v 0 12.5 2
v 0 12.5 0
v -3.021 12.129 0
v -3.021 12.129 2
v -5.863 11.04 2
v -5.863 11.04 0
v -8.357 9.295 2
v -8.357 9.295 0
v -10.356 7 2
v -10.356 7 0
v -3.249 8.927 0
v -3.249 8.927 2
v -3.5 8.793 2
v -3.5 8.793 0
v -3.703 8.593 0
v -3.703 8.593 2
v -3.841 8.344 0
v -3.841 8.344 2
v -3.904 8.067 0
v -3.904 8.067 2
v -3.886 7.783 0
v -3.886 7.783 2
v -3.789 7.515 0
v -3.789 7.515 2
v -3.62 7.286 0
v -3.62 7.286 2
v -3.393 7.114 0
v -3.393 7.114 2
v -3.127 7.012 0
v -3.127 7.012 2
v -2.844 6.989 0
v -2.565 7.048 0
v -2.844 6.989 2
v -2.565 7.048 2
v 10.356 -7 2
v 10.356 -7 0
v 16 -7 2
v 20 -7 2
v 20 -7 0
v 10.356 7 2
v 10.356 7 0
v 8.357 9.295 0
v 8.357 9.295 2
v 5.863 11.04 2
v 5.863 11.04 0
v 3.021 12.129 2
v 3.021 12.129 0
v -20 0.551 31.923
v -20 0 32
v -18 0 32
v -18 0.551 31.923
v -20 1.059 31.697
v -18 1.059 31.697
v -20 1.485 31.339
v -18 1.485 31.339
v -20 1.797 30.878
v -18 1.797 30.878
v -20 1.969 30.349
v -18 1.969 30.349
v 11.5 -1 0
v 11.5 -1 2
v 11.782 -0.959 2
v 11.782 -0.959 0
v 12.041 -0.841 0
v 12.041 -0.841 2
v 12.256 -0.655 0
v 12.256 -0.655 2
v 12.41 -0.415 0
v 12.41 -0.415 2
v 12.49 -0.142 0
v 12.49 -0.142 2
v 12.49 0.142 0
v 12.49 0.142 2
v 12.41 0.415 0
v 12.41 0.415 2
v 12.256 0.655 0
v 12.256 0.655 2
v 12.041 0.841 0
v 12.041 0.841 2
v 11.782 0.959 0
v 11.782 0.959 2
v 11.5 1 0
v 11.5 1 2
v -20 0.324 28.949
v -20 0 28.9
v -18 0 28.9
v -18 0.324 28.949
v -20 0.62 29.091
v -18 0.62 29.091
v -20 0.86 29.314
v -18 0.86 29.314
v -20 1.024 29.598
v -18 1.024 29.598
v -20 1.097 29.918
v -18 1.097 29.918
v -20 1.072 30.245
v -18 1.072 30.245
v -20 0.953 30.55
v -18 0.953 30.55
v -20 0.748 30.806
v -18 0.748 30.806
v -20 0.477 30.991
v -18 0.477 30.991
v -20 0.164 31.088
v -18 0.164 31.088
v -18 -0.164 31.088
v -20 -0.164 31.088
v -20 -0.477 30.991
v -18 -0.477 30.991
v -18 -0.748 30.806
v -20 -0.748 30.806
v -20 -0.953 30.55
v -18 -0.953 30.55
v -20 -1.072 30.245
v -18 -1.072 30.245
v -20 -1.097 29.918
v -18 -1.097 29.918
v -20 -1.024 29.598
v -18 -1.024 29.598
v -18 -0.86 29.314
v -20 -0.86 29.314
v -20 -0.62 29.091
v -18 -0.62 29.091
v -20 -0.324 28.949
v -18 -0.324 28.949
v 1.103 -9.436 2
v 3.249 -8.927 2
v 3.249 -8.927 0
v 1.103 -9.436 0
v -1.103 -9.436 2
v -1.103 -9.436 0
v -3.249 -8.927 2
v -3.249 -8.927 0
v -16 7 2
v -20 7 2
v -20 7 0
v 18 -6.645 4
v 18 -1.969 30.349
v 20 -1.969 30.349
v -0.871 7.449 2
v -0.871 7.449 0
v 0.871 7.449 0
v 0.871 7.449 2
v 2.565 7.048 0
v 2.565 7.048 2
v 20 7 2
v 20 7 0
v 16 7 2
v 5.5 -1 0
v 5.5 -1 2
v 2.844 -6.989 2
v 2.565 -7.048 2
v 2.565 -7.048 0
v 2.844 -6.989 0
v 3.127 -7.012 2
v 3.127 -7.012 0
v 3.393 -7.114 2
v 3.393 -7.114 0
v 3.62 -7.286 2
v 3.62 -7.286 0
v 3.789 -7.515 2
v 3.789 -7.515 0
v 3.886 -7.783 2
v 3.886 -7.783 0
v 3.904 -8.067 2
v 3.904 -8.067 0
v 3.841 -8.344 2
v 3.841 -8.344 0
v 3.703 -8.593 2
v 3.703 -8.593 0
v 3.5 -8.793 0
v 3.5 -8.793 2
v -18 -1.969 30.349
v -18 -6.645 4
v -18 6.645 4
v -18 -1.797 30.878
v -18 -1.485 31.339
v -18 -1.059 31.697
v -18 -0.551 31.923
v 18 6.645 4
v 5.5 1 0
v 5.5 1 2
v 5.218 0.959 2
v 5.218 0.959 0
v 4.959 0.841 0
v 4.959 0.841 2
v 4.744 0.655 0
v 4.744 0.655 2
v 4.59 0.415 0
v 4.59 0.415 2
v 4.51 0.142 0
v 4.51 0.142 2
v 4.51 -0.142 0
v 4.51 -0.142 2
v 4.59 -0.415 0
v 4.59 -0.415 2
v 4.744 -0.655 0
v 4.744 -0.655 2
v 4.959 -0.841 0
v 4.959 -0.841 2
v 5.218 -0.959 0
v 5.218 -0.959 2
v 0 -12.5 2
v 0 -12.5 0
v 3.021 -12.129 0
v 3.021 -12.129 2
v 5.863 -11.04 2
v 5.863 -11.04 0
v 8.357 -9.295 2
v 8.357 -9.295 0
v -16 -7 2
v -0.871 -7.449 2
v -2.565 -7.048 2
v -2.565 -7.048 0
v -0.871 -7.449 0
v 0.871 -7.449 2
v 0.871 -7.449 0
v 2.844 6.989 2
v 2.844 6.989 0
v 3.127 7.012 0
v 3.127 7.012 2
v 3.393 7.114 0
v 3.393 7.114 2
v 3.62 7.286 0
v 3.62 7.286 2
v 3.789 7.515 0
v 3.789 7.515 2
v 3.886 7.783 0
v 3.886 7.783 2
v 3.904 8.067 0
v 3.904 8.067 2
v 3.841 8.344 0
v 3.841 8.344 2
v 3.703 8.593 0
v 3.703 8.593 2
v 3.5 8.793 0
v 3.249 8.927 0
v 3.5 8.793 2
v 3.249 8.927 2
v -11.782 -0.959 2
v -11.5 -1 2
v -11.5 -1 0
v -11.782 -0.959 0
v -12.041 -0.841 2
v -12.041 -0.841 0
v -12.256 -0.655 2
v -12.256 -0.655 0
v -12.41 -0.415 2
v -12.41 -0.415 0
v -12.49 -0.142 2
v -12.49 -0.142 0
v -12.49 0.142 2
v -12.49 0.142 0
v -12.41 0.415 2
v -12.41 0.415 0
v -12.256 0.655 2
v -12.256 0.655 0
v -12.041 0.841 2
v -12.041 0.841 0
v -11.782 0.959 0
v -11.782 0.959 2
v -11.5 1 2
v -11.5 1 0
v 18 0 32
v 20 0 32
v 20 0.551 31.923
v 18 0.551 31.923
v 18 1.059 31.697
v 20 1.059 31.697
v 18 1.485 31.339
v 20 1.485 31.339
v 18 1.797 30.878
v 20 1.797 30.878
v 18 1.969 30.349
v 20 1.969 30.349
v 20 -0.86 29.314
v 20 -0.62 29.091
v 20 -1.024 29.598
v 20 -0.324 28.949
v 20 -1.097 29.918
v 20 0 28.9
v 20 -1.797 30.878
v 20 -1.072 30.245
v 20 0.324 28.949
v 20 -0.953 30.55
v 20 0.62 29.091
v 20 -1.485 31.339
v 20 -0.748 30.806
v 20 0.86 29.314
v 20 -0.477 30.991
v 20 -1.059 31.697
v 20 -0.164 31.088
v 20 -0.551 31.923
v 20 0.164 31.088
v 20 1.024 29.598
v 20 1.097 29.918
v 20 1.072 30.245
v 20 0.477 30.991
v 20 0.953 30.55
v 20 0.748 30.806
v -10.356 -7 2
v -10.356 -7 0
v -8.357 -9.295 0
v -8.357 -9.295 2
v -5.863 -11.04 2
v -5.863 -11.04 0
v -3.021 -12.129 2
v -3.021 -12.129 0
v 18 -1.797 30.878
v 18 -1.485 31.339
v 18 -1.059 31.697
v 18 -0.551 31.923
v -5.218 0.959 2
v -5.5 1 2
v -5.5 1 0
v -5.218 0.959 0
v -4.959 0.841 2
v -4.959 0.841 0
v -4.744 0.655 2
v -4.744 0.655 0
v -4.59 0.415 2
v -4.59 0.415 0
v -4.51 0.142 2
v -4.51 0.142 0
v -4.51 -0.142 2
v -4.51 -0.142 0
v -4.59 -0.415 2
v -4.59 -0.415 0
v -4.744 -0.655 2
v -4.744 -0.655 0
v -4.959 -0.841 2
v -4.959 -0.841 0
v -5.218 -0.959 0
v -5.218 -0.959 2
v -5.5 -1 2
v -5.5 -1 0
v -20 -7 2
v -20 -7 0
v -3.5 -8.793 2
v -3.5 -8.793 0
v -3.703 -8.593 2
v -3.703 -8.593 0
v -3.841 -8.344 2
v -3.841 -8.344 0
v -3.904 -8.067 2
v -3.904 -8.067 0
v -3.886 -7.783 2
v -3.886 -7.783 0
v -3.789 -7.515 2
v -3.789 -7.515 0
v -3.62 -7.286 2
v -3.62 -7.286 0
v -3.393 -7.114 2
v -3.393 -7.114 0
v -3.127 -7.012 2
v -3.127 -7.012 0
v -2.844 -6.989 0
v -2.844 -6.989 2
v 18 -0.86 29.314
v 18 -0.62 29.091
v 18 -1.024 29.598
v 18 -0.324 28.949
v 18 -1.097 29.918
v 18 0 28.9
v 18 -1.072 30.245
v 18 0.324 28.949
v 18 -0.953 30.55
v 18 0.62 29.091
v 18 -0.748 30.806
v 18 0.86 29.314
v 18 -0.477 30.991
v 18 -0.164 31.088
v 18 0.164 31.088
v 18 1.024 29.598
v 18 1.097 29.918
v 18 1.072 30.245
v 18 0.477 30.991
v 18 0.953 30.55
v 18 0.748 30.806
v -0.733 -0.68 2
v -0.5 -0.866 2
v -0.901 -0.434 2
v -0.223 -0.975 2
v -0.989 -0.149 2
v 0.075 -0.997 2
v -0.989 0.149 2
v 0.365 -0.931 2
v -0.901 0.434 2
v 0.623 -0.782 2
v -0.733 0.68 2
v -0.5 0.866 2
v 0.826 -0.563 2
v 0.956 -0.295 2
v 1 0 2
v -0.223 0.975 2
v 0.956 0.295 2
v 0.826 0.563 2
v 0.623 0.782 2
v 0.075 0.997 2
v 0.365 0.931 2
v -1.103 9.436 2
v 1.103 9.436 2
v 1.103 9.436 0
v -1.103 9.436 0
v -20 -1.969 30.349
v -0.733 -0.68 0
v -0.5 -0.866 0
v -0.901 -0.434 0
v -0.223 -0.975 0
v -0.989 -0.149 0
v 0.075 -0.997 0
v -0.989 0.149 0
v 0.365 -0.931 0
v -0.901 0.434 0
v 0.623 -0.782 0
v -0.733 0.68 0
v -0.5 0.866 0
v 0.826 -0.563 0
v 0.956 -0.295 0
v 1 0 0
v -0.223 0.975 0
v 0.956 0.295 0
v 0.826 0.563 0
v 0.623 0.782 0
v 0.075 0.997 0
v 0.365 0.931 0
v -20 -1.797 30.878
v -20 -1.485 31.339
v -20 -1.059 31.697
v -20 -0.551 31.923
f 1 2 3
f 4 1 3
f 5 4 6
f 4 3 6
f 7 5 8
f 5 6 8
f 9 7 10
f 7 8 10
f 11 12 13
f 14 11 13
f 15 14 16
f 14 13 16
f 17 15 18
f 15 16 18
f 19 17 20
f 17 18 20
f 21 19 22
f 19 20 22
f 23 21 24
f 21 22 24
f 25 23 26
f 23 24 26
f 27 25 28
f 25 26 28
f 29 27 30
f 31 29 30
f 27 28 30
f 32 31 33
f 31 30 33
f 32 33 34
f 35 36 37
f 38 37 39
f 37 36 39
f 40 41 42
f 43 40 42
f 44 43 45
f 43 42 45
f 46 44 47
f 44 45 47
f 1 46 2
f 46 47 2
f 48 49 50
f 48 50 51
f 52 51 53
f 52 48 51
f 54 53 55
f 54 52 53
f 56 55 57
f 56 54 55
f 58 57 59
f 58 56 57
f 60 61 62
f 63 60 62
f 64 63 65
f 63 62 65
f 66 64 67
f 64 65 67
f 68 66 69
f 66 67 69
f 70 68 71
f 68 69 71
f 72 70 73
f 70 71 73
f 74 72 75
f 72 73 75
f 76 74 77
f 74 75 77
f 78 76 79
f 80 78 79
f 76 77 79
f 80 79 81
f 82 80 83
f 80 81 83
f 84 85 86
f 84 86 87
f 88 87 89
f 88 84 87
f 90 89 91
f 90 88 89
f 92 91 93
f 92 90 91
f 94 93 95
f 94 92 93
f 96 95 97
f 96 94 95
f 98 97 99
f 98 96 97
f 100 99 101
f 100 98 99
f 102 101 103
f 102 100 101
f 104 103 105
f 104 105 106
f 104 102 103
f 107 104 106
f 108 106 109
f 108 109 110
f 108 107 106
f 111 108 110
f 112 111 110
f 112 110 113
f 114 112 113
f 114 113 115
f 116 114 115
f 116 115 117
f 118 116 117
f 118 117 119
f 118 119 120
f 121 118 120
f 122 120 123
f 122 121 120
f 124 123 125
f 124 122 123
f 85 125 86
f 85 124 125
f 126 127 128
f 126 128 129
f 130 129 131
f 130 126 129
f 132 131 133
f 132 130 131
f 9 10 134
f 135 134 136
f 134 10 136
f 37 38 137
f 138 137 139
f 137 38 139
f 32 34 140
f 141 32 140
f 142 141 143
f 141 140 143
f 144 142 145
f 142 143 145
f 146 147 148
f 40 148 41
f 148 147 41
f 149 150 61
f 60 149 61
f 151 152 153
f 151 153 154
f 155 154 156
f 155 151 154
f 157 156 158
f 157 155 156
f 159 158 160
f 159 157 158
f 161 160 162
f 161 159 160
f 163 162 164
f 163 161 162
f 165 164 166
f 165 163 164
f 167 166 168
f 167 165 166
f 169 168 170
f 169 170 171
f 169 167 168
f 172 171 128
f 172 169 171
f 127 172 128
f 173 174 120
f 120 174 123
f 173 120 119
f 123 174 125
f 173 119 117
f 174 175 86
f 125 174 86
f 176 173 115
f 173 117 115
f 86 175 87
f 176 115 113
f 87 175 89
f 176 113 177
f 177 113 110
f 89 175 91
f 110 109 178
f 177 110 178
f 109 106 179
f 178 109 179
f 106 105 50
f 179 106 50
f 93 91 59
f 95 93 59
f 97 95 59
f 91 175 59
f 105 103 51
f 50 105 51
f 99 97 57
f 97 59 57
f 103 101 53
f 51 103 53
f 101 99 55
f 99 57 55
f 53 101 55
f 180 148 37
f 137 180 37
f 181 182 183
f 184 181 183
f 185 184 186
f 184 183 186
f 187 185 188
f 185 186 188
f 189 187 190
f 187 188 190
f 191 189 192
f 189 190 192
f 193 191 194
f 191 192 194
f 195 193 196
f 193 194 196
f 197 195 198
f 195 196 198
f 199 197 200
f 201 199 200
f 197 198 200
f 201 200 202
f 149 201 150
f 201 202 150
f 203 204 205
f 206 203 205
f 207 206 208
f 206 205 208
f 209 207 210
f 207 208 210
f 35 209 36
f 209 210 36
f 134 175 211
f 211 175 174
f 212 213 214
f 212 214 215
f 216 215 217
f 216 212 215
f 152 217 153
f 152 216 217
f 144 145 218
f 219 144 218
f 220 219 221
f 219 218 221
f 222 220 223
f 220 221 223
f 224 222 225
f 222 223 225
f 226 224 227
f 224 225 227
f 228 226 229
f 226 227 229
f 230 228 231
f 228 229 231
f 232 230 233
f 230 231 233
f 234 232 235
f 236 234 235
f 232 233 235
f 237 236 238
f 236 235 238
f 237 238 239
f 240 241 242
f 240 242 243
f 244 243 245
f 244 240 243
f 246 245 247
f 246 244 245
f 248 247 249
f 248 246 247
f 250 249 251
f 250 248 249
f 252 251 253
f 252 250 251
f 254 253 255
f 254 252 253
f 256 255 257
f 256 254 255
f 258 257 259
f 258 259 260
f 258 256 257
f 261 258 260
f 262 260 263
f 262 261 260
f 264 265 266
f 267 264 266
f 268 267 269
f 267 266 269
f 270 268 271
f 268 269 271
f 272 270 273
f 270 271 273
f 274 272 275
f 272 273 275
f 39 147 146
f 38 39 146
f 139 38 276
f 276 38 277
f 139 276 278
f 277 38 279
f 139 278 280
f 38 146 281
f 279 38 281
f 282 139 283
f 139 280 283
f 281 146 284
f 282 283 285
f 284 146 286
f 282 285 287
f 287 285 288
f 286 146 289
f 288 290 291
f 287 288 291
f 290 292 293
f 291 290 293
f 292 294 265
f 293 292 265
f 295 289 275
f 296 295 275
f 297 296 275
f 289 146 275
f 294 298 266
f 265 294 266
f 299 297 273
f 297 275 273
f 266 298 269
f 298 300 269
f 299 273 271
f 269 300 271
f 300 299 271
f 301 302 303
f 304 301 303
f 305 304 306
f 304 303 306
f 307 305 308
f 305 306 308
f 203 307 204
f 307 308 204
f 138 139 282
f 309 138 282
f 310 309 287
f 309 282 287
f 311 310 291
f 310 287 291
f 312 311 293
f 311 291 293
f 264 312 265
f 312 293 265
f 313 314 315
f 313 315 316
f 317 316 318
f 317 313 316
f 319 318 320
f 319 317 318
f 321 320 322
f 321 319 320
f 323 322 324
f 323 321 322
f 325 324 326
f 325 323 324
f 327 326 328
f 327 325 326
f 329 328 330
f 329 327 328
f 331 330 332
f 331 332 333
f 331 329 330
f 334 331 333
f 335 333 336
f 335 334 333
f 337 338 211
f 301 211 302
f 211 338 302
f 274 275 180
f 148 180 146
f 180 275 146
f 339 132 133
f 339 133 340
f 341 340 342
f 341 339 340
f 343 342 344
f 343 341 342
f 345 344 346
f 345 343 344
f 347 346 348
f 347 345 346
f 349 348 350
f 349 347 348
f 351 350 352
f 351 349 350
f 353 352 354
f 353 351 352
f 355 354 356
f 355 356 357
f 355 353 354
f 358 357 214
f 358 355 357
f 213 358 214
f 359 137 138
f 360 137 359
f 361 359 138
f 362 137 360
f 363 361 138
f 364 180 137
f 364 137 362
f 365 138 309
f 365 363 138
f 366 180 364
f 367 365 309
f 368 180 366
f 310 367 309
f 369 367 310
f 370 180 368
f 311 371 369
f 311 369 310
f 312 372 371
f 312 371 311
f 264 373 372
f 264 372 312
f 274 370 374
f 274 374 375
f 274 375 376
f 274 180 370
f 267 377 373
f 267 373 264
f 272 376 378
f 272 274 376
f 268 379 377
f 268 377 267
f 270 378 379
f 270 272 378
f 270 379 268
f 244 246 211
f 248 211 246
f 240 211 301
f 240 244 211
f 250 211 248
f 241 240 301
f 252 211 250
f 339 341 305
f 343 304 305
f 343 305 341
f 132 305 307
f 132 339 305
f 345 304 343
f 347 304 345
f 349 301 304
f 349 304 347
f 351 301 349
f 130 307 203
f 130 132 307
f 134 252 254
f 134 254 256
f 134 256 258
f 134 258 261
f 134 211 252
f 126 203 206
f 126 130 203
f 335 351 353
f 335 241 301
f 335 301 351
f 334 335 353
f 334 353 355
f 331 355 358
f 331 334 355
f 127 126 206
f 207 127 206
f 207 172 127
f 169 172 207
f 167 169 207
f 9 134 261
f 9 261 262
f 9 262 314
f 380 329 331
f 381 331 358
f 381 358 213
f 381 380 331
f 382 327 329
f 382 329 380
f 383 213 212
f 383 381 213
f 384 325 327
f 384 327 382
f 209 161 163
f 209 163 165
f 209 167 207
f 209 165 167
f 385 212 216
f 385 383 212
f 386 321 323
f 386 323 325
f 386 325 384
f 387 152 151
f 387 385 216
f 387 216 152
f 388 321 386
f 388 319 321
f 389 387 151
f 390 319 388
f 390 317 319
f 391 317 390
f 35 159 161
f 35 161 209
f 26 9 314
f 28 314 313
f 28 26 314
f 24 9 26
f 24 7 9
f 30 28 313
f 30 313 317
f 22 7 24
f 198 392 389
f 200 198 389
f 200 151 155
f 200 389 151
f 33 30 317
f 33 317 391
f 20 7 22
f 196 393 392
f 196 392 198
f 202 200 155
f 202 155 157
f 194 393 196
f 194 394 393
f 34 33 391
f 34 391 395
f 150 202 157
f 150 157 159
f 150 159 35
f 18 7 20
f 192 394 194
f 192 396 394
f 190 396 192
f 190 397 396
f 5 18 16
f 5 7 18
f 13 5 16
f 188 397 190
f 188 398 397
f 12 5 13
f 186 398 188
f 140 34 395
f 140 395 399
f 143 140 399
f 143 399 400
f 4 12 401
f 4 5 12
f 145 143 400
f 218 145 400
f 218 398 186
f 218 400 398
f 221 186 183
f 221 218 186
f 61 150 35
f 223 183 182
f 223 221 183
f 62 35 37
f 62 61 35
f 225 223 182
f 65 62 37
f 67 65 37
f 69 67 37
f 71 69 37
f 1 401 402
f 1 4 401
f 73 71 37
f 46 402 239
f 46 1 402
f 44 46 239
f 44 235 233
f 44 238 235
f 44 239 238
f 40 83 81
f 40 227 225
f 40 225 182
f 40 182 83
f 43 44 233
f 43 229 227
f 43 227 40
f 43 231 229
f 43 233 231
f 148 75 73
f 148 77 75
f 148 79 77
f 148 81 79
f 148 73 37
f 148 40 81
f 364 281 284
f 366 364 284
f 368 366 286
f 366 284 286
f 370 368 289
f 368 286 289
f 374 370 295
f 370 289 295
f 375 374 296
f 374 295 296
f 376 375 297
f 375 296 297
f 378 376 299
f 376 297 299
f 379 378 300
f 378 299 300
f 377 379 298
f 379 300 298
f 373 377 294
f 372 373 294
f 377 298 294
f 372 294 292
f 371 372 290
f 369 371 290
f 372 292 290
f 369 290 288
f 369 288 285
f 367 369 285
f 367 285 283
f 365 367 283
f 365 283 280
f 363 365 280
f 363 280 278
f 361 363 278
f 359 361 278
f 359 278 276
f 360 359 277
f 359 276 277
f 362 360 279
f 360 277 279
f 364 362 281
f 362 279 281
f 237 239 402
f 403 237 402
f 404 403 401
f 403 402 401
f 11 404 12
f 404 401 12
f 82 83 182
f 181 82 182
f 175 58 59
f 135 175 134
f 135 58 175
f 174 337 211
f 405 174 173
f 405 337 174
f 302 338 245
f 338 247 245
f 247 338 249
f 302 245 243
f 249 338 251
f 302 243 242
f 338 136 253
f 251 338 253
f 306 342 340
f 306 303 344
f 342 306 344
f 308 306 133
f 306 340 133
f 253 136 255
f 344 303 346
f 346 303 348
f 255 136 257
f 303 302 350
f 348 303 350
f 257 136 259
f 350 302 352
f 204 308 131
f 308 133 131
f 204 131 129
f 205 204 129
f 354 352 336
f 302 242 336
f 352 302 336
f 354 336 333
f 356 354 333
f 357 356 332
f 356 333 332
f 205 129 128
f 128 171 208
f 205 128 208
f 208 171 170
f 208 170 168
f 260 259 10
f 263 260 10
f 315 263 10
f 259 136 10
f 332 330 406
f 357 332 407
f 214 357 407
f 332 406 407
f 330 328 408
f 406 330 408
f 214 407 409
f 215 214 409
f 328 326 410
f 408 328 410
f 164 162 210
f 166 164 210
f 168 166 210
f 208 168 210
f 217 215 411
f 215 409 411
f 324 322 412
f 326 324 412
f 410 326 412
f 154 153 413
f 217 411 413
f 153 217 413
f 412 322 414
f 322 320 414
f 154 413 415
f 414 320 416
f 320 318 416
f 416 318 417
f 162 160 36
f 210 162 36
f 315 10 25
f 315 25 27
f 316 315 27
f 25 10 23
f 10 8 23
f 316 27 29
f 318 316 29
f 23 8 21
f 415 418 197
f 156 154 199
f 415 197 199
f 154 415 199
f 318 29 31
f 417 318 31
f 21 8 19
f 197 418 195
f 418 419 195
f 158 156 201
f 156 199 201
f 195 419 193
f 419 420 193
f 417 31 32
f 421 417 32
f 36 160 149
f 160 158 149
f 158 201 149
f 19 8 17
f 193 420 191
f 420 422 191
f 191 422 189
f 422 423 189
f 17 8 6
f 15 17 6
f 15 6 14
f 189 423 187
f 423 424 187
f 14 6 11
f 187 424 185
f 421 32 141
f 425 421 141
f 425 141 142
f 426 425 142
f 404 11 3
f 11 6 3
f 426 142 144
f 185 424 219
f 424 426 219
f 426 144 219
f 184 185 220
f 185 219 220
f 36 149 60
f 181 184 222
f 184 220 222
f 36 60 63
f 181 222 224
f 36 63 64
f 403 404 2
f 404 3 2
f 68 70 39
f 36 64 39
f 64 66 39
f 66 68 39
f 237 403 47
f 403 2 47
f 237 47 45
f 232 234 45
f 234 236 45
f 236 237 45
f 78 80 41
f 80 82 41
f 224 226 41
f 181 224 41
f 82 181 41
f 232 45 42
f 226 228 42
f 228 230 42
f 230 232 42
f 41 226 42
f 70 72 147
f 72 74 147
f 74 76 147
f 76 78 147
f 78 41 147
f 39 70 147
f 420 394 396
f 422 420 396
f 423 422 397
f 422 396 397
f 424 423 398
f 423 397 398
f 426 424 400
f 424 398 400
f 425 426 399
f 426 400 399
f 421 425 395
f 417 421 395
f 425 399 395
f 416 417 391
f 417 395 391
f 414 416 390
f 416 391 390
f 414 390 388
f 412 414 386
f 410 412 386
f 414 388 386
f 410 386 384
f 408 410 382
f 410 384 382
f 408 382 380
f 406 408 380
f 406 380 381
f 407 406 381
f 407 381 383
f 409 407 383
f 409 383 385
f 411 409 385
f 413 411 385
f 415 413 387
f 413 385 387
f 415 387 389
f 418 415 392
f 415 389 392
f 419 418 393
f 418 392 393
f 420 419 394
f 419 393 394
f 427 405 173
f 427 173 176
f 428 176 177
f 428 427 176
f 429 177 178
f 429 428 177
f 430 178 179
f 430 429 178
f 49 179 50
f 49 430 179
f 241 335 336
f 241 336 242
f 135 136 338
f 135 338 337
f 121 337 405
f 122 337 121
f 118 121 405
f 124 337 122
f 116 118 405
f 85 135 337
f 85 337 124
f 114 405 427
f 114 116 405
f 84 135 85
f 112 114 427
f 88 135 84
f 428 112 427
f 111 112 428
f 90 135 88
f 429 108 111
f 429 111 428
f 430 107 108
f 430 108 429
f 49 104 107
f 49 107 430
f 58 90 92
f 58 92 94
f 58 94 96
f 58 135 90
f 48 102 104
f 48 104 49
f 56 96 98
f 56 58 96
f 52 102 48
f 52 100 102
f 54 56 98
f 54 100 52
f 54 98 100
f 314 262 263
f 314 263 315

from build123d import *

# Parameters (mm, degrees)
EXTRUDE_1_DEPTH     = 2
EXTRUDE_2_DEPTH     = 2
SKETCH_3_R          = 1
CUT_EXTRUDE_1_DEPTH = 2
CHAMFER_1_SIZE      = 2


with BuildPart() as part:
    # 草图1 → 凸台-拉伸1 (new body)
    with BuildSketch(Plane.XY):
        with BuildLine():
            Line((-20, -7), (-10.356157589, -7))
            ThreePointArc((-10.356157589, -7), (-12.5, 0), (-10.356157589, 7))
            Line((-10.356157589, 7), (-20, 7))
            Line((-20, 7), (-20, -7))
        make_face()
        with BuildLine():
            ThreePointArc((-10.356157589, -7), (-5.8630197, -11.039701083), (0, -12.5))
            Line((0, -12.5), (0, 12.5))
            ThreePointArc((0, 12.5), (-5.8630197, 11.039701083), (-10.356157589, 7))
            ThreePointArc((-10.356157589, 7), (-12.5, 0), (-10.356157589, -7))
        make_face()
        with BuildLine():
            Line((0, 12.5), (0, -12.5))
            ThreePointArc((0, -12.5), (5.8630197, -11.039701083), (10.356157589, -7))
            Line((10.356157589, -7), (10.356157589, 7))
            ThreePointArc((10.356157589, 7), (5.8630197, 11.039701083), (0, 12.5))
        make_face()
        with BuildLine():
            Line((10.356157589, 7), (10.356157589, -7))
            ThreePointArc((10.356157589, -7), (11.952028486, -3.66046651), (12.5, 0))
            ThreePointArc((12.5, 0), (11.952028486, 3.66046651), (10.356157589, 7))
        make_face()
        with BuildLine():
            ThreePointArc((12.5, 0), (11.952028486, -3.66046651), (10.356157589, -7))
            Line((10.356157589, -7), (20, -7))
            Line((20, -7), (20, 7))
            Line((20, 7), (10.356157589, 7))
            ThreePointArc((10.356157589, 7), (11.952028486, 3.66046651), (12.5, 0))
        make_face()
    extrude(amount=EXTRUDE_1_DEPTH)

    # 草图2 → 凸台-拉伸2 (add)
    with BuildSketch(Plane.ZY.offset(20)):
        with BuildLine():
            Line((28.9, 0), (2, 0))
            Line((2, 0), (2, -7))
            Line((2, -7), (30.34945143, -1.969234292))
            ThreePointArc((30.34945143, -1.969234292), (31.532792037, -1.284736771), (32, 0))
            Line((32, 0), (31.1, 0))
            ThreePointArc((31.1, 0), (30, -1.1), (28.9, 0))
        make_face()
        with BuildLine():
            Line((30.34945143, 1.969234292), (2, 7))
            Line((2, 7), (2, 0))
            Line((2, 0), (28.9, 0))
            ThreePointArc((28.9, 0), (30, 1.1), (31.1, 0))
            Line((31.1, 0), (32, 0))
            ThreePointArc((32, 0), (31.532792037, 1.284736771), (30.34945143, 1.969234292))
        make_face()
    extrude_2 = extrude(amount=-EXTRUDE_2_DEPTH)

    # 镜向1: 凸台-拉伸2 across plane
    add(extrude_2.mirror(Plane(origin=(0, 0, 0), x_dir=(0, 0, 1), z_dir=(1, 0, 0))))

    # 草图3 → 切除-拉伸1 (cut)
    with BuildSketch(Plane.XY.offset(2)):
        Circle(SKETCH_3_R)
        with BuildLine():
            Line((-11.5, 1), (-5.5, 1))
            ThreePointArc((-5.5, 1), (-4.5, 0), (-5.5, -1))
            Line((-5.5, -1), (-11.5, -1))
            ThreePointArc((-11.5, -1), (-12.5, 0), (-11.5, 1))
        make_face()
        with BuildLine():
            ThreePointArc((3.249191362, 8.927079897), (0, 9.5), (-3.249191362, 8.927079897))
            ThreePointArc((-3.249191362, 8.927079897), (-3.846863839, 7.645367133), (-2.565151075, 7.047694656))
            ThreePointArc((-2.565151075, 7.047694656), (0, 7.5), (2.565151075, 7.047694656))
            ThreePointArc((2.565151075, 7.047694656), (3.846863839, 7.645367133), (3.249191362, 8.927079897))
        make_face()
    cut_extrude_1 = extrude(amount=-CUT_EXTRUDE_1_DEPTH, mode=Mode.SUBTRACT)

    # 镜向2: 切除-拉伸1 across plane
    add(cut_extrude_1.mirror(Plane.ZX), mode=Mode.SUBTRACT)

    # 镜向3: 切除-拉伸1 across plane
    add(cut_extrude_1.mirror(Plane(origin=(0, 0, 0), x_dir=(0, 0, 1), z_dir=(1, 0, 0))), mode=Mode.SUBTRACT)

    # 倒角1
    chamfer_1_edges = [part.edges().sort_by_distance(p)[0] for p in [
        (-18, 0, 2),
        (18, 0, 2),
    ]]
    chamfer(chamfer_1_edges, length=CHAMFER_1_SIZE)


solid = part.part
